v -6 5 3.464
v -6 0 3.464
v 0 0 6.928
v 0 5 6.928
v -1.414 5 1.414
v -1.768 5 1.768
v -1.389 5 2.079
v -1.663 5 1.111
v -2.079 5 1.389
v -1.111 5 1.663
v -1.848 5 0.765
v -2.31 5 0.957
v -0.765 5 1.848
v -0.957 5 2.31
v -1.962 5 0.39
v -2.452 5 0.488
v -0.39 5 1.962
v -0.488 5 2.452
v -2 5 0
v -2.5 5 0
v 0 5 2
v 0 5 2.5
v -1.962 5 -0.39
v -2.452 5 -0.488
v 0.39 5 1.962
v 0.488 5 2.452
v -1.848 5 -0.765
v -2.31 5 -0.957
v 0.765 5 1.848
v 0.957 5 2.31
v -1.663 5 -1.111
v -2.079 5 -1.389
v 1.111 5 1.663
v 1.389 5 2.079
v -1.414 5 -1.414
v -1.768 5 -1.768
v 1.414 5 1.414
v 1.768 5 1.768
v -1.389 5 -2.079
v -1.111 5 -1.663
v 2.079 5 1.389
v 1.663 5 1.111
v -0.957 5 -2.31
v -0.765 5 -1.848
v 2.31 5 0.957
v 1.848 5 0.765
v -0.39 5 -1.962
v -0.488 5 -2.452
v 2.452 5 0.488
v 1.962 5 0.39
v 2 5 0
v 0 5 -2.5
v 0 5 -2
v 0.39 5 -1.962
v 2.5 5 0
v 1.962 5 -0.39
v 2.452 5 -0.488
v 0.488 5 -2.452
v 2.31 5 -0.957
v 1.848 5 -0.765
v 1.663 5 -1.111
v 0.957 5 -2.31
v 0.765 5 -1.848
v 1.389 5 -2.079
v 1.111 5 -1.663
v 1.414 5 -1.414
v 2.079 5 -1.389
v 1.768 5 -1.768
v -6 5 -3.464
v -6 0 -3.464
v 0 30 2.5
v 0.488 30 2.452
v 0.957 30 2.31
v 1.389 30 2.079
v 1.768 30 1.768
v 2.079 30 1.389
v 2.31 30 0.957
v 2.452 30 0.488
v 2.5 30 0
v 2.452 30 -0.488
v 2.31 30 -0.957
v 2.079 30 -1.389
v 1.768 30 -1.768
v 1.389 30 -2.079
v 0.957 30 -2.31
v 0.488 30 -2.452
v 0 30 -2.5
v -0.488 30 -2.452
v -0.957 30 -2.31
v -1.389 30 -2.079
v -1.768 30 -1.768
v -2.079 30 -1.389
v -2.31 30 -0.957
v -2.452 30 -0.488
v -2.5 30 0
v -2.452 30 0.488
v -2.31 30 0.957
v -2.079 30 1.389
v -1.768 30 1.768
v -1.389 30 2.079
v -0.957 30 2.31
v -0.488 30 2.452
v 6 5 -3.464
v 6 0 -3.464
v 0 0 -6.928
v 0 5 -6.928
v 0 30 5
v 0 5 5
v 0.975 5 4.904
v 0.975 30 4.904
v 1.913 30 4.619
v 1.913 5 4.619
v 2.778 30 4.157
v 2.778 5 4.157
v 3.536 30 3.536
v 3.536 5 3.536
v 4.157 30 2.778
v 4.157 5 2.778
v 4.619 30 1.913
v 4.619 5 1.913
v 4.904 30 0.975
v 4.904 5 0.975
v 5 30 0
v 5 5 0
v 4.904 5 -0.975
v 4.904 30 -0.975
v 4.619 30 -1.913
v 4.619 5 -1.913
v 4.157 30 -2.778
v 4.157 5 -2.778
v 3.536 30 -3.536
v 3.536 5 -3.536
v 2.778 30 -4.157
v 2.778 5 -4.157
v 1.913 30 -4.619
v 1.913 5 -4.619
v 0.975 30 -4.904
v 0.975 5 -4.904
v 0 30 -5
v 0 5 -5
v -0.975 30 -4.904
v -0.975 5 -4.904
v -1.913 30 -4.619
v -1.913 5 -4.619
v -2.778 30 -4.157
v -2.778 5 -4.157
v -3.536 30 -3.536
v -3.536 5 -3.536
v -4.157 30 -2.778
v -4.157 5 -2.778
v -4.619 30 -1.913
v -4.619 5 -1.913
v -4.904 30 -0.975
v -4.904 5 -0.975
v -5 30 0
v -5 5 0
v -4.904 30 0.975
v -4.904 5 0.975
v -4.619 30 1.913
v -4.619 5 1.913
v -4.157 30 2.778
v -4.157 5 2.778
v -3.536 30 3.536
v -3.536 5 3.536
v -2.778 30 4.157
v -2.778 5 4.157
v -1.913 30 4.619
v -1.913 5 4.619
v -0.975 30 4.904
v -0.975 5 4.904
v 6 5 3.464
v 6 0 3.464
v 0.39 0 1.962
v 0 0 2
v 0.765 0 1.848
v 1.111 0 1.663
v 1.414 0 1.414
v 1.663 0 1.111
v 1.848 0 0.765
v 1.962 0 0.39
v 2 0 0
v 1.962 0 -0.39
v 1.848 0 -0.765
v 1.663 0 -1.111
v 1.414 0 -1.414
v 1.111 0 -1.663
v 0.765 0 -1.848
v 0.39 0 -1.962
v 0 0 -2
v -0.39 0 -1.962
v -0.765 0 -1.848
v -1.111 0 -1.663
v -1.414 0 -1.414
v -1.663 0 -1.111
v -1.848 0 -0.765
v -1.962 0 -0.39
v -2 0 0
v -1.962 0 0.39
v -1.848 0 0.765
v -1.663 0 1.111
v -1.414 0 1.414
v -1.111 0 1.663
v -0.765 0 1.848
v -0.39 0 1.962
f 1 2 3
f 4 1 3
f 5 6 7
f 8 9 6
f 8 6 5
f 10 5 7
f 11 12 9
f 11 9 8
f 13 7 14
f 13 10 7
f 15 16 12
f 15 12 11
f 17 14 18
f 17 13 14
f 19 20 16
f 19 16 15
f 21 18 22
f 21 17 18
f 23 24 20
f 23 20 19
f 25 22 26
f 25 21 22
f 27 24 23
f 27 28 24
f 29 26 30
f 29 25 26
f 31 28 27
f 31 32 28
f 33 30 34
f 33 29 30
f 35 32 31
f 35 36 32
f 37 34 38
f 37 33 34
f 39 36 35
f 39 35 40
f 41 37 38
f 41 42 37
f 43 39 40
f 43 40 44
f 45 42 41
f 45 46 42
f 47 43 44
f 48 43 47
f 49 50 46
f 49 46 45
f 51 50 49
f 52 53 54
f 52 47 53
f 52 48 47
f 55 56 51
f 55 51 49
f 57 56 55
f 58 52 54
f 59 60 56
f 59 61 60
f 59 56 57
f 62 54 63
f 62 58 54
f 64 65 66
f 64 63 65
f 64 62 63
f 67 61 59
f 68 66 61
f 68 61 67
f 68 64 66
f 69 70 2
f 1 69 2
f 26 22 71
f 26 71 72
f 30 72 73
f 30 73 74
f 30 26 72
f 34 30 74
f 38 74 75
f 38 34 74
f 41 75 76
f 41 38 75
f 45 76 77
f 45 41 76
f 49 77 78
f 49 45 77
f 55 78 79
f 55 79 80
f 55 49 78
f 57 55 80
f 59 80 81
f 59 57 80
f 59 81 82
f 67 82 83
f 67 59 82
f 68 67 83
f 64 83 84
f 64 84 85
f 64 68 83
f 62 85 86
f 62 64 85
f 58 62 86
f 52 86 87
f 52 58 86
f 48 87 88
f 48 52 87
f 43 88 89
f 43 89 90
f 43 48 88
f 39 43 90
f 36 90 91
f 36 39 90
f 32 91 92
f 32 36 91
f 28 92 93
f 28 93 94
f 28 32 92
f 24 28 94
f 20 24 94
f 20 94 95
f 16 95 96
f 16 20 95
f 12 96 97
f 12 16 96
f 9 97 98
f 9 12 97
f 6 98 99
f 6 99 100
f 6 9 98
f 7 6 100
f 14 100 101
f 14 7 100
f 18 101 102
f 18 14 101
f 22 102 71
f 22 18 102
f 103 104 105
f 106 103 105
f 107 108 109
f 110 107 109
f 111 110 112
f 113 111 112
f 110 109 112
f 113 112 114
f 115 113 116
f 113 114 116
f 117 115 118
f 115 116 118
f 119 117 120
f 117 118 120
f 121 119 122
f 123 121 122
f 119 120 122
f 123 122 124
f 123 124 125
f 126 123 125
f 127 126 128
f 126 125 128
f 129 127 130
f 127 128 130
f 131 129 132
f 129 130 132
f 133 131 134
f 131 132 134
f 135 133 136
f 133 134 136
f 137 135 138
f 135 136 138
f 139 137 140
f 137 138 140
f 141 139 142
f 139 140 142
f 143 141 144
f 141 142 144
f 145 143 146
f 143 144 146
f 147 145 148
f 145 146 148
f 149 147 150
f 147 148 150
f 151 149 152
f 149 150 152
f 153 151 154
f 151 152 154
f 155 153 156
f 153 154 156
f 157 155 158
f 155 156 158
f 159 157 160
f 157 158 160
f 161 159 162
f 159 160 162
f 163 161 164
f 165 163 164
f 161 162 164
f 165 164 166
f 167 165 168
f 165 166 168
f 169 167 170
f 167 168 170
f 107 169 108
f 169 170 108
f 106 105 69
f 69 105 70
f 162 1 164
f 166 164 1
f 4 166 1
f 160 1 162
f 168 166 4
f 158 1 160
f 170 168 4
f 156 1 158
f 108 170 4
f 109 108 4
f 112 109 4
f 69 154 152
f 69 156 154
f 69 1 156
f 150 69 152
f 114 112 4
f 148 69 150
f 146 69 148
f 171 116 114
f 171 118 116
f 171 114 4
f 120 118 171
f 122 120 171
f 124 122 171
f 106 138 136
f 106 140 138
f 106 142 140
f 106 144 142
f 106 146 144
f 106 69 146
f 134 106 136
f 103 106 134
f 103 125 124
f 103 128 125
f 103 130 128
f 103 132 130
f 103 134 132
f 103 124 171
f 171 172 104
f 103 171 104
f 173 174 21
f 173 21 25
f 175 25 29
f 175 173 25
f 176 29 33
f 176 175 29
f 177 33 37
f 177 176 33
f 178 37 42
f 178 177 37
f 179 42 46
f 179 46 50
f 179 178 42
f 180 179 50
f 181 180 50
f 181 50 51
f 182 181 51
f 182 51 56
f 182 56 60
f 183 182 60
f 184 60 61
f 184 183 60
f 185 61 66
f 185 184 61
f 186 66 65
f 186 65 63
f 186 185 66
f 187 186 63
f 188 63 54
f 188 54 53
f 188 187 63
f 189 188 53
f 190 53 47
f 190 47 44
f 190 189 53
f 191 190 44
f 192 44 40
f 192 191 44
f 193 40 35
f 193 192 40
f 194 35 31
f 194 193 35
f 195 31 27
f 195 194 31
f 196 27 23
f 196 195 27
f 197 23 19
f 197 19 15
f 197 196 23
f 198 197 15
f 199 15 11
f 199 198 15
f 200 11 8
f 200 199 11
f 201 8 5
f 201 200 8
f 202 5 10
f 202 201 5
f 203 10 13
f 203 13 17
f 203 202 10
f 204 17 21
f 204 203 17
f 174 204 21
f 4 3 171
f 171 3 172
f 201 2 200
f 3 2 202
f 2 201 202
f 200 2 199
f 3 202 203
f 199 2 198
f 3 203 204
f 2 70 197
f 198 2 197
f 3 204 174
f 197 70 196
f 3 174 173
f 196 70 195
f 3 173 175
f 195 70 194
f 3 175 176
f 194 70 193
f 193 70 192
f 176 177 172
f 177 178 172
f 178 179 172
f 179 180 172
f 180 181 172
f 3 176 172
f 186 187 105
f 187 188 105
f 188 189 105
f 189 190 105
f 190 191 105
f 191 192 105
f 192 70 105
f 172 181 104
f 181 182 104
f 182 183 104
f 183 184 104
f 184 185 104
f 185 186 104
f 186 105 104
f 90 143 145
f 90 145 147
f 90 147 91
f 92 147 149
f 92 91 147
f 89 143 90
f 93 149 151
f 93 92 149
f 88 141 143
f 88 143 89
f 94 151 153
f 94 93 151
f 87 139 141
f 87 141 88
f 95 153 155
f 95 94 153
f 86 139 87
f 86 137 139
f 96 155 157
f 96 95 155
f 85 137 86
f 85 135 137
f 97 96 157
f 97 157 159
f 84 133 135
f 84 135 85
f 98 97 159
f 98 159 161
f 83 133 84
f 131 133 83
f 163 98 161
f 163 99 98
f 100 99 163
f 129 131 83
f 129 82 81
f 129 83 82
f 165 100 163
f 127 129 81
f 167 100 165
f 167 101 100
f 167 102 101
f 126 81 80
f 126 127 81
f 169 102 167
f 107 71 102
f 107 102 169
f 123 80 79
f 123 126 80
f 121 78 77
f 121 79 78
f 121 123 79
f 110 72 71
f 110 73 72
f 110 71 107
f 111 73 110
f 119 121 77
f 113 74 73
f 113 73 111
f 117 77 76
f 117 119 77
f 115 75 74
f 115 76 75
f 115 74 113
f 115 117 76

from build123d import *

# Parameters (mm, degrees)
SKETCH_1_R      = 2
EXTRUDE_1_DEPTH = 5
SKETCH_2_R      = 5
SKETCH_2_R_2    = 2.5
EXTRUDE_2_DEPTH = 25


with BuildPart() as part:
    # 草图1 → 凸台-拉伸1 (new body)
    with BuildSketch(Plane(origin=(0, 0, 0), x_dir=(1, 0, 0), z_dir=(0, 1, 0))):
        Polygon((0, 6.92820323), (-6, 3.464101615), (-6, -3.464101615), (0, -6.92820323), (6, -3.464101615), (6, 3.464101615), align=None)
        with Locations(Location((0, 0, 0), (0, 0, 270))):
            Circle(SKETCH_1_R, mode=Mode.SUBTRACT)
    extrude(amount=EXTRUDE_1_DEPTH)

    # 草图2 → 凸台-拉伸2 (add)
    with BuildSketch(Plane(origin=(0, 5, 0), x_dir=(1, 0, 0), z_dir=(0, 1, 0))):
        with Locations(Location((0, 0, 0), (0, 0, 270))):
            Circle(SKETCH_2_R)
        with Locations(Location((0, 0, 0), (0, 0, 270))):
            Circle(SKETCH_2_R_2, mode=Mode.SUBTRACT)
    extrude(amount=EXTRUDE_2_DEPTH)


solid = part.part
